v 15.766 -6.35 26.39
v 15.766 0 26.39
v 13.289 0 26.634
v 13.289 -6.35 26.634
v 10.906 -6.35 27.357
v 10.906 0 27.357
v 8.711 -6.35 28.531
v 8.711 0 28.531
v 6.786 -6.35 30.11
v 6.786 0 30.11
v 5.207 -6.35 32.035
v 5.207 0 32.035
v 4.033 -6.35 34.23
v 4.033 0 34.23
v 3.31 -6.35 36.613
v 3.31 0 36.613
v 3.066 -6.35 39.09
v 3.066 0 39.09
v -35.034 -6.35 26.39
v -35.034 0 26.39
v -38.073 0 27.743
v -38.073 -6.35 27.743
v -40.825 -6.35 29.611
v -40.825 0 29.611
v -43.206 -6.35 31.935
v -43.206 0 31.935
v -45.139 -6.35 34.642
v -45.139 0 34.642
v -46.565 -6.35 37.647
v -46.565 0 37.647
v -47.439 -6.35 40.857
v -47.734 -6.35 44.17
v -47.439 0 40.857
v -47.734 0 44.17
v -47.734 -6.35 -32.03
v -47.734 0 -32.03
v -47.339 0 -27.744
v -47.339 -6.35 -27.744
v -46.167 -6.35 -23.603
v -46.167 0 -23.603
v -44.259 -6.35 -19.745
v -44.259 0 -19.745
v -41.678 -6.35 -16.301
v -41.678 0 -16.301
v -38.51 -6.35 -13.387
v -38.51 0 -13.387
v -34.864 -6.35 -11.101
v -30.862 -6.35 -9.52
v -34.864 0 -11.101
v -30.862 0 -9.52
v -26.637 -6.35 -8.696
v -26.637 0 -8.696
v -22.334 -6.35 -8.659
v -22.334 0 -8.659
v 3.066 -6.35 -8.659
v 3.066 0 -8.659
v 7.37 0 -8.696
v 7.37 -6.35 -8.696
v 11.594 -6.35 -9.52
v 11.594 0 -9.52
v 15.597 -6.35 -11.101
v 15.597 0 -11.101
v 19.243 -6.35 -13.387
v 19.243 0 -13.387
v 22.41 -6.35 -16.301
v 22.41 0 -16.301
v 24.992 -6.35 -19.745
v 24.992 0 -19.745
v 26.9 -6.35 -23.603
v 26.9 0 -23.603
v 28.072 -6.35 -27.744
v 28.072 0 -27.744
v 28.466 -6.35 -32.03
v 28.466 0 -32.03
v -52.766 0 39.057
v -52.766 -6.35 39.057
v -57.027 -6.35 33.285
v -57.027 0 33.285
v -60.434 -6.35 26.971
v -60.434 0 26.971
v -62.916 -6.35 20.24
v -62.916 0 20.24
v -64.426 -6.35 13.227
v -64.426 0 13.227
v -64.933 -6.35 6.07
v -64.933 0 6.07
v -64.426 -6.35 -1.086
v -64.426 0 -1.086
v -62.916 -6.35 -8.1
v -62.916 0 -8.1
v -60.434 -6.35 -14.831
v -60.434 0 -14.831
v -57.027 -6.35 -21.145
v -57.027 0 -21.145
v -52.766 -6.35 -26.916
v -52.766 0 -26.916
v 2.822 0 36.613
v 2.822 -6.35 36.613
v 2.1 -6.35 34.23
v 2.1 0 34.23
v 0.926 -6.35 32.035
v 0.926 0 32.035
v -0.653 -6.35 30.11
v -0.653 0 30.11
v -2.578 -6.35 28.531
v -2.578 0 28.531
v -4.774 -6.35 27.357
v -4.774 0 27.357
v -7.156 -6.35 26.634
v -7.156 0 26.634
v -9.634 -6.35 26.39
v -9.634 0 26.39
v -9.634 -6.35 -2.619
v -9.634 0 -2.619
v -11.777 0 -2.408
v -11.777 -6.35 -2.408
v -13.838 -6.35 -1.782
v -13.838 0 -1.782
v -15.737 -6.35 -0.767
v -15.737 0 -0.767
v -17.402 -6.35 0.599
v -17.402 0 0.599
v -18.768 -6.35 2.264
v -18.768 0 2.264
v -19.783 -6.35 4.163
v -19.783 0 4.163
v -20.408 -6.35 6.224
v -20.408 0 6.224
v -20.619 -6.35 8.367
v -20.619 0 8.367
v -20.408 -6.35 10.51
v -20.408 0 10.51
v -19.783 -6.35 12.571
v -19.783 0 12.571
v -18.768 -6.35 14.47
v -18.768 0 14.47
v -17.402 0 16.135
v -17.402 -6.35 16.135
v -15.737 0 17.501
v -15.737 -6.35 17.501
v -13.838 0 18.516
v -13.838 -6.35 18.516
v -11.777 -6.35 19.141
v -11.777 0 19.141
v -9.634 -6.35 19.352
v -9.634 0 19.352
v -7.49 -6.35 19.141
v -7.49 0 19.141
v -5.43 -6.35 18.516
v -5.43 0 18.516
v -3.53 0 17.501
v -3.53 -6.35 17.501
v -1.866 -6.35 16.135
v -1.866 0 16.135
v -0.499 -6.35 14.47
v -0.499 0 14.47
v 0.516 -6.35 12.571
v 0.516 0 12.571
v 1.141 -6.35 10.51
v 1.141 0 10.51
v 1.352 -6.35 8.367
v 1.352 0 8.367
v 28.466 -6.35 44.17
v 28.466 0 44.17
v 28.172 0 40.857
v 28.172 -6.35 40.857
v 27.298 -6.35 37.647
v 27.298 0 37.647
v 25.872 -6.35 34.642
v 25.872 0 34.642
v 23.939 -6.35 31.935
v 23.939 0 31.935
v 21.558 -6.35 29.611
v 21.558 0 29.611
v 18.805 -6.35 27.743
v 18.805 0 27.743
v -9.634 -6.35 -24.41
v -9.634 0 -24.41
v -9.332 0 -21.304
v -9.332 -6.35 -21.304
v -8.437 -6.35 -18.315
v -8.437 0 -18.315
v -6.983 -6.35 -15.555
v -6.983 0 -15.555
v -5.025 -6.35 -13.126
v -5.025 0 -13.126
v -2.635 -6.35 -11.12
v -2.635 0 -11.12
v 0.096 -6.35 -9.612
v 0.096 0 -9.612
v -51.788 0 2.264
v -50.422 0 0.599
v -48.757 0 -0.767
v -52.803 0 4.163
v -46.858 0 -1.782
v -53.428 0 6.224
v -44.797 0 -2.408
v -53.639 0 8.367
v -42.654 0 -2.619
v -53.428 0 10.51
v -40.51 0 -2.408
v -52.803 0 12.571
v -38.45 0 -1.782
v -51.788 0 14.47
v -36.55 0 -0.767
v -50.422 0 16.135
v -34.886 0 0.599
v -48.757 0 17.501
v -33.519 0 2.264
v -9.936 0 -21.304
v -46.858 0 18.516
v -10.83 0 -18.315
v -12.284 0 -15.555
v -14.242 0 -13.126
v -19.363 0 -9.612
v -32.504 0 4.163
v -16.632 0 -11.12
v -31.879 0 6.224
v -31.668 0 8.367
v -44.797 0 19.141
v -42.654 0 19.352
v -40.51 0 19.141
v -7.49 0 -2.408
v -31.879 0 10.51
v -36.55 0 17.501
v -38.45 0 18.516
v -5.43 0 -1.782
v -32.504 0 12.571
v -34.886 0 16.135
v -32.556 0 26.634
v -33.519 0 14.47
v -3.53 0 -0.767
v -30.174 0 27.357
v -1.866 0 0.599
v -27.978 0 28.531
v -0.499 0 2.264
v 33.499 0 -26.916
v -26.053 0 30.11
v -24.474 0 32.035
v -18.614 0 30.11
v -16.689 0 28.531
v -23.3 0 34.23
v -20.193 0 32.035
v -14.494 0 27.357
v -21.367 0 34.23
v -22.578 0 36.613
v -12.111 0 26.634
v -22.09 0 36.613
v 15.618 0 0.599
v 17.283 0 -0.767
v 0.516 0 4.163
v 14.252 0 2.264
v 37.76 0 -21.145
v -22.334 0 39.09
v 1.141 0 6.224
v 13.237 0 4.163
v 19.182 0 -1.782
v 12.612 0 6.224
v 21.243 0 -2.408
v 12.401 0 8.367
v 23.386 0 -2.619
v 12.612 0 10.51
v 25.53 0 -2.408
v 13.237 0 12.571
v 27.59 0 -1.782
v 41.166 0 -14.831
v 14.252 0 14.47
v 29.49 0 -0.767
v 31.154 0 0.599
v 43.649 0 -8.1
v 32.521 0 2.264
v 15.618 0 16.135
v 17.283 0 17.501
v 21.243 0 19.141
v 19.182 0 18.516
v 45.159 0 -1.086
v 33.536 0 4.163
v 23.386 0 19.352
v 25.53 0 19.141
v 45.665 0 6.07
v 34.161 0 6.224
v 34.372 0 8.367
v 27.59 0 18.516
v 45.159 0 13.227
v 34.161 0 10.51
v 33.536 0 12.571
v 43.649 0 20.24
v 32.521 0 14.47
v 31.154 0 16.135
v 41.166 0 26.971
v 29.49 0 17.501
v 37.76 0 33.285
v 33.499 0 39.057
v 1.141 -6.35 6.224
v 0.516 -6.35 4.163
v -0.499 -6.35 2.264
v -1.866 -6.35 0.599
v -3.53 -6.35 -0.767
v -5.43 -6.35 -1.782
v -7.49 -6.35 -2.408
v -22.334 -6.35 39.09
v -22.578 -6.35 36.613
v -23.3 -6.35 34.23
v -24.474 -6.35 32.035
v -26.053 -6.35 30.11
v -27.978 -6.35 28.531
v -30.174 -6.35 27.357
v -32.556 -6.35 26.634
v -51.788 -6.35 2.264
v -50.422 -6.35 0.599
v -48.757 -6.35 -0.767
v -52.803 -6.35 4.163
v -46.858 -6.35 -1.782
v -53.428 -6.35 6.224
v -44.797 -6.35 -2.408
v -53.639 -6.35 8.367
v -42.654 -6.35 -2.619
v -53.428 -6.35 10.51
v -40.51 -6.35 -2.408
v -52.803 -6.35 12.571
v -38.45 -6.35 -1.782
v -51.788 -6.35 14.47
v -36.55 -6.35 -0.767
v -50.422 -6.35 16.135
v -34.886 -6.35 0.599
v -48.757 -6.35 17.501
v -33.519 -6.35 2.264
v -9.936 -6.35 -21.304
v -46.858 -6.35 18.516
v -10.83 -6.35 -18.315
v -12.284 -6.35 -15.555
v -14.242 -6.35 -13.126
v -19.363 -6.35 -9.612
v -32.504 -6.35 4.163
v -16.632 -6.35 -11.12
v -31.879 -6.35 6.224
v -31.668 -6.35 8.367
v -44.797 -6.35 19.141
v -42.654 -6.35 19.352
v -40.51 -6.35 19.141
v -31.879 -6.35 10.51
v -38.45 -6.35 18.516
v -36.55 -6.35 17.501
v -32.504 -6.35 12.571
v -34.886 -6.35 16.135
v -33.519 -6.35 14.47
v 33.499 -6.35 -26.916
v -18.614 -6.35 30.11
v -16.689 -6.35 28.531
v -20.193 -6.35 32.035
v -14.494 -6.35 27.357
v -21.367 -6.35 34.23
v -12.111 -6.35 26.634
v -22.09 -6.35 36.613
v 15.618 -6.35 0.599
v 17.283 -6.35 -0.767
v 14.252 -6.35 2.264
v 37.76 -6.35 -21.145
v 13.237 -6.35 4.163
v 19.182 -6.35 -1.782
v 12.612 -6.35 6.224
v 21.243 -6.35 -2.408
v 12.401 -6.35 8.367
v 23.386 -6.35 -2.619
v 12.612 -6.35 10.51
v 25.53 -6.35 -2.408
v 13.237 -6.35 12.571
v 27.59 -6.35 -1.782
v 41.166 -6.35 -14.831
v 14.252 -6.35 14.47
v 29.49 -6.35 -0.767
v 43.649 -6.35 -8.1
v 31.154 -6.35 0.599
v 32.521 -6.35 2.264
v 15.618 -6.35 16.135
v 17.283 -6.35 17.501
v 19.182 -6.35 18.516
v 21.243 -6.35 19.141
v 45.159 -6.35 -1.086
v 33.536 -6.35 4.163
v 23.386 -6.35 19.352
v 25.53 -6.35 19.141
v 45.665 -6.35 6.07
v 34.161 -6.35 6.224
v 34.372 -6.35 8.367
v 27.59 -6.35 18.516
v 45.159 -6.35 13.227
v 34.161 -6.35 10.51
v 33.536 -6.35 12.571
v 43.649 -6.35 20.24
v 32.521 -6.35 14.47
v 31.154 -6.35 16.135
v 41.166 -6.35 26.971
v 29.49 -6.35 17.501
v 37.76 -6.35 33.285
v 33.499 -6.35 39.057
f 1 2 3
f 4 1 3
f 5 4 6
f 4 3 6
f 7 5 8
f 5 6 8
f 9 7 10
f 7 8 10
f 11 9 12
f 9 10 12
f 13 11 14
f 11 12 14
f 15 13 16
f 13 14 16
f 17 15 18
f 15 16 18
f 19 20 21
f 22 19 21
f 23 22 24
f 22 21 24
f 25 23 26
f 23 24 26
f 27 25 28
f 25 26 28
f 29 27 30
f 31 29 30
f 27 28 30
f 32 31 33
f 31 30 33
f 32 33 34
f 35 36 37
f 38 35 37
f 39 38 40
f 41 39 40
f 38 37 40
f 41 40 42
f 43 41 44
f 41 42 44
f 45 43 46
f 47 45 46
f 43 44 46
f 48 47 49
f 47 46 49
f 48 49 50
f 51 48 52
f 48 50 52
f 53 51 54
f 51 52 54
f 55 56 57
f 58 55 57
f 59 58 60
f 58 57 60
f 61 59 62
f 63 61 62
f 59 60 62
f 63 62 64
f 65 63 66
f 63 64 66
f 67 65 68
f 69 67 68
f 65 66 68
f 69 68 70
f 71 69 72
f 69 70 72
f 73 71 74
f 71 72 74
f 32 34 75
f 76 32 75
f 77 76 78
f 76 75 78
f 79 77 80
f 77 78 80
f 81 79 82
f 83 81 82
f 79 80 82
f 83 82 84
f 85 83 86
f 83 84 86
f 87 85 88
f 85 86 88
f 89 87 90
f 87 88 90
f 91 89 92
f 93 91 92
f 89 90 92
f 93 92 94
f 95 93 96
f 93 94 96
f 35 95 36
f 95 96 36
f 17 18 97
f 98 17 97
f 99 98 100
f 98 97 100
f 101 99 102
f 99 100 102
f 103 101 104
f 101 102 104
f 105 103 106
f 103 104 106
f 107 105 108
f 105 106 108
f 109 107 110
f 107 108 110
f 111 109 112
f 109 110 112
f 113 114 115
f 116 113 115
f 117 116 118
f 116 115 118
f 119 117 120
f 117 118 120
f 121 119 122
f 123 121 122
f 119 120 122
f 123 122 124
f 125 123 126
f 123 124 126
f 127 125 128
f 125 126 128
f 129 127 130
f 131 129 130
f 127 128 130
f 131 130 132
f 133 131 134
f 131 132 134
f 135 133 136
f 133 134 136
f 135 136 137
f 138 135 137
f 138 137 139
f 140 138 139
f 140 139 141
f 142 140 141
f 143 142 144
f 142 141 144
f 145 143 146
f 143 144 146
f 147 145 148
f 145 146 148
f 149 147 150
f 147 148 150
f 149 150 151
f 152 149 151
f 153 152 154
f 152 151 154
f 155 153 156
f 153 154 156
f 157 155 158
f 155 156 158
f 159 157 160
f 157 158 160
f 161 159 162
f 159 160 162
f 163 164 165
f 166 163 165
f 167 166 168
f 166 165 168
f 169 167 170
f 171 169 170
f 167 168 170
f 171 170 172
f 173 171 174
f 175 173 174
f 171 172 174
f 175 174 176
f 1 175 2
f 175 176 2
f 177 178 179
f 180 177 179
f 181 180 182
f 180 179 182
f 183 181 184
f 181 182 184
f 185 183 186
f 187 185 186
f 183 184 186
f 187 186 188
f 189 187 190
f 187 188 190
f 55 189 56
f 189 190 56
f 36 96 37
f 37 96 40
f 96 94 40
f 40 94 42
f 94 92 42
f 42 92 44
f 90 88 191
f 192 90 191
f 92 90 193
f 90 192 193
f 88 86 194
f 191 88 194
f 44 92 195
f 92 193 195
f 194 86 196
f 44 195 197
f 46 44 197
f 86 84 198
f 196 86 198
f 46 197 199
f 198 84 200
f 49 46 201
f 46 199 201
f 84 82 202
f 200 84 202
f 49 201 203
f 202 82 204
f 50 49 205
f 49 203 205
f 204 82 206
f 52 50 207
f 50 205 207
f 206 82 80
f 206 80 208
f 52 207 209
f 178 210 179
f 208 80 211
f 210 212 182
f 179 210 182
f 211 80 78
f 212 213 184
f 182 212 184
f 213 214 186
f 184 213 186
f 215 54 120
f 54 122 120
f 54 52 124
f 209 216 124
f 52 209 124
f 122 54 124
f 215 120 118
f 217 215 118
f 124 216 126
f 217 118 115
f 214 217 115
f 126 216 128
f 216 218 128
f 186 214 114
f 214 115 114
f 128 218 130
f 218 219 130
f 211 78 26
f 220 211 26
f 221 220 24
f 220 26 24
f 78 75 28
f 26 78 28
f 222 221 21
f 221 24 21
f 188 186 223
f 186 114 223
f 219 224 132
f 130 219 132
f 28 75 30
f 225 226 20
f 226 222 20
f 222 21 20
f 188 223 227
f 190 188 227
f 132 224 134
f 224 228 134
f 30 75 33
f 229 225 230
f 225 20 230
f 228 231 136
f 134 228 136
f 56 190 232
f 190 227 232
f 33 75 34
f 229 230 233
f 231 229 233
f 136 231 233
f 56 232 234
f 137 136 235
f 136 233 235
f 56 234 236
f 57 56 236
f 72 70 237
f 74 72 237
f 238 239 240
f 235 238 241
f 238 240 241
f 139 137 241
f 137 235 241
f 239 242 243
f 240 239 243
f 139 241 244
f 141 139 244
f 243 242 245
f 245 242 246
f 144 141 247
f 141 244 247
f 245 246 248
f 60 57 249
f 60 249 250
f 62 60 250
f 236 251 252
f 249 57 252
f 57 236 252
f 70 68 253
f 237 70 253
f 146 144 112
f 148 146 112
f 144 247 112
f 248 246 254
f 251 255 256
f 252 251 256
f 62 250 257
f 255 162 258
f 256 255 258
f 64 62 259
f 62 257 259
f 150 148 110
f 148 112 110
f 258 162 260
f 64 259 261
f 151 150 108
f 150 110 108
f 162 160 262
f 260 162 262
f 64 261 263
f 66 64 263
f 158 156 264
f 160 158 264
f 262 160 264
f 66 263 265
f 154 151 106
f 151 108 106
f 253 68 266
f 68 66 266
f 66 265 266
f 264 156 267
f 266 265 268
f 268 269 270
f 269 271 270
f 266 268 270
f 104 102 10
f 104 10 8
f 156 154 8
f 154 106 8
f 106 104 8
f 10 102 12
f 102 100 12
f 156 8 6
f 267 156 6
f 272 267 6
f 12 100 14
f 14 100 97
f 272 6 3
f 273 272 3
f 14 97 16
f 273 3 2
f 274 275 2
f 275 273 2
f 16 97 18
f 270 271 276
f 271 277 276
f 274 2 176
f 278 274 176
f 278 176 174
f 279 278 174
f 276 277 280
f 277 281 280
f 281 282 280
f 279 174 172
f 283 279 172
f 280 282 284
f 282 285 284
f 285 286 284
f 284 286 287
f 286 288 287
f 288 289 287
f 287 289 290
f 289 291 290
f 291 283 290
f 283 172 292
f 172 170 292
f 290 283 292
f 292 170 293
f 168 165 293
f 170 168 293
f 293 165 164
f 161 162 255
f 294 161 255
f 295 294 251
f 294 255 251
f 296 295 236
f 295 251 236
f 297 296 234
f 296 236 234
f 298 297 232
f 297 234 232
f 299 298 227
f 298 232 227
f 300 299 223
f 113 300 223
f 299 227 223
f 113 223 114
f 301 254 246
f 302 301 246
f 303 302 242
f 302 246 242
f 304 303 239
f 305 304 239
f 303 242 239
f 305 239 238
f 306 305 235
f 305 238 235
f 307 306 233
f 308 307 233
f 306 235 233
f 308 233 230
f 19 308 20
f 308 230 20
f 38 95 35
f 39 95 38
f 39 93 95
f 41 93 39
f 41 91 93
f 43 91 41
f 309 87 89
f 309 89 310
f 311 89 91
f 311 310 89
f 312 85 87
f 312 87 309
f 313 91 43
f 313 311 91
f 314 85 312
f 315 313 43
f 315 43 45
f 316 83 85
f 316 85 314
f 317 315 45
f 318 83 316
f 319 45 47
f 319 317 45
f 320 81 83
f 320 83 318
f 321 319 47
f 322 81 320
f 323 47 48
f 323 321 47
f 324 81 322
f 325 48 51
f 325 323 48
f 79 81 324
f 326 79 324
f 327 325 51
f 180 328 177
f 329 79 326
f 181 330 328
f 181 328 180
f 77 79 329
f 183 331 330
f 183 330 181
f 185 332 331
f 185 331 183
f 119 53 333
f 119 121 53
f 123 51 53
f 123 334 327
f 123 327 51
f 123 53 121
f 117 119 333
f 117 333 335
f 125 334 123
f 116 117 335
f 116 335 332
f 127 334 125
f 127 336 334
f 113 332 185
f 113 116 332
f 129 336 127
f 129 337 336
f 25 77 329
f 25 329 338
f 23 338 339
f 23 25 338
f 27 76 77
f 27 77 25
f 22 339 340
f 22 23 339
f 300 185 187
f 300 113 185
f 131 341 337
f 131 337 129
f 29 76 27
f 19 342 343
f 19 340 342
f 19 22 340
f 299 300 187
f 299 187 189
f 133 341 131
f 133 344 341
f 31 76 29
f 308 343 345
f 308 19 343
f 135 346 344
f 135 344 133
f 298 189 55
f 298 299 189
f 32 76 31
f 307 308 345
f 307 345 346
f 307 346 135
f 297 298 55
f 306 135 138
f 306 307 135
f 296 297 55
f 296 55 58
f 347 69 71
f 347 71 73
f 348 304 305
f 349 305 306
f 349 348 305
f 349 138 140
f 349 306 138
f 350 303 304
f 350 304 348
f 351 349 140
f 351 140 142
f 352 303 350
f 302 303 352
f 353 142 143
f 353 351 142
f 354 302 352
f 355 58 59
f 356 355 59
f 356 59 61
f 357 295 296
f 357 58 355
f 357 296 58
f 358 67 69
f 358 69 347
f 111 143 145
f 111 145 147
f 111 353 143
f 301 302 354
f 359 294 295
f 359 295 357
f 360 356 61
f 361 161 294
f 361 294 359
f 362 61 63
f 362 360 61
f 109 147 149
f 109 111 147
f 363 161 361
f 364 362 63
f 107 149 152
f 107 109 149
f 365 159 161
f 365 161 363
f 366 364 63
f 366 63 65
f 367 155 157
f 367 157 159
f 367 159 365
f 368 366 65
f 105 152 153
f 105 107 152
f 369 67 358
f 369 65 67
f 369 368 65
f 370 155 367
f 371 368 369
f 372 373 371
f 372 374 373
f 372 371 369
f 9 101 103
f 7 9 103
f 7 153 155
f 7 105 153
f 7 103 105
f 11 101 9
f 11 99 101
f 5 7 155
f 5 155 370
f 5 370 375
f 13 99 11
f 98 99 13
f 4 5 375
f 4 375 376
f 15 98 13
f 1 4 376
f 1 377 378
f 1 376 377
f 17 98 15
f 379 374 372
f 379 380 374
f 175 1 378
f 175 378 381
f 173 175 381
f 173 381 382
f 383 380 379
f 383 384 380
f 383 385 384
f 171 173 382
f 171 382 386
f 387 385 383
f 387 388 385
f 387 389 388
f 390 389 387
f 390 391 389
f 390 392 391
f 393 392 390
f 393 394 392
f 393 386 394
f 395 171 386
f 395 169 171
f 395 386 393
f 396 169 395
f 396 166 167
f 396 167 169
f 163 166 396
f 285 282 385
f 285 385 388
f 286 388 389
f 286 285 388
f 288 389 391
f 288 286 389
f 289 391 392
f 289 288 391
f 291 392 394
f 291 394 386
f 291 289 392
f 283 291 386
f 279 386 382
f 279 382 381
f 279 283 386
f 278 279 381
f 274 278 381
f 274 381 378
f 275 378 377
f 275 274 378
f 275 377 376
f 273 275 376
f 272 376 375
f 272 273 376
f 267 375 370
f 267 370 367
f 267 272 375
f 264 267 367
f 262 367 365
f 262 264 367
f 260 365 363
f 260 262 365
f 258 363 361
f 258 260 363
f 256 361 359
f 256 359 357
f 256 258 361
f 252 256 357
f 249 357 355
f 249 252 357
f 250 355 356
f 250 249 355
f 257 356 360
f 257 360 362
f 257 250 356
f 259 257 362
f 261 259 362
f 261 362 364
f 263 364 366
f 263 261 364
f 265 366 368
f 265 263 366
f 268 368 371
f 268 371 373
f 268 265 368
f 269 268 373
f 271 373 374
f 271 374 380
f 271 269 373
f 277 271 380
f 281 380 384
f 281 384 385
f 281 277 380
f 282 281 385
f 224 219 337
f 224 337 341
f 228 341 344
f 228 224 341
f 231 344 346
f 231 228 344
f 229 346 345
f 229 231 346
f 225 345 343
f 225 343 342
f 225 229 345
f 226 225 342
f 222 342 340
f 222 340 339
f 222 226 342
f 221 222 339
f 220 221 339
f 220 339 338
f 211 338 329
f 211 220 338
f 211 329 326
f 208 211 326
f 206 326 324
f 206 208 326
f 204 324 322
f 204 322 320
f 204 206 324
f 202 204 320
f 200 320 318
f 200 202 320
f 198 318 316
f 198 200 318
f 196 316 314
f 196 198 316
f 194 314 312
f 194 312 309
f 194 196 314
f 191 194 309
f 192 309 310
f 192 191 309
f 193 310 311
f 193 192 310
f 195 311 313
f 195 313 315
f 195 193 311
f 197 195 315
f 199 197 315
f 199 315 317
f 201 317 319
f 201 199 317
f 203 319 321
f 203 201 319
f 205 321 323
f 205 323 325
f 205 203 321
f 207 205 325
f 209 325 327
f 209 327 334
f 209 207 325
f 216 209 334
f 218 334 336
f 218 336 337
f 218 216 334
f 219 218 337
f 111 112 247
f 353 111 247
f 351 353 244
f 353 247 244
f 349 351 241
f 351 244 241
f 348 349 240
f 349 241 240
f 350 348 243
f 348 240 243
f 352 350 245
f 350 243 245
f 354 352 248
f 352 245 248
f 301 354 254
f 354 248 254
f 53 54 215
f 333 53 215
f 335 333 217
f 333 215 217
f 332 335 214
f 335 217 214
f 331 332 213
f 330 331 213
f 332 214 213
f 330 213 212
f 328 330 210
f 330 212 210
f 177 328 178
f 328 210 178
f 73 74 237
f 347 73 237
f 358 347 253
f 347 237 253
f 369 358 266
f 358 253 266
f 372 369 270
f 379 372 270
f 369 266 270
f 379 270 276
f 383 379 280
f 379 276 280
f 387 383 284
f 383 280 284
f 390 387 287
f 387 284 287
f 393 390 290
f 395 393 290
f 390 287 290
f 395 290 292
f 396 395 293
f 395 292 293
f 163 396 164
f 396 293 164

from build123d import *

# Parameters (mm, degrees)
F0_R     = 10.9855
F1_DEPTH = 6.35


with BuildPart() as f1:
    # F0 (on Front) → F1 (new body)
    with BuildSketch(Plane.XZ):
        with BuildLine():
            ThreePointArc((-22.3335889539, 39.0903010637), (-26.0533328328, 30.1100449426), (-35.0335889539, 26.3903010637))
            ThreePointArc((-35.0335889539, 26.3903010637), (-44.2325232787, 33.2453479745), (-47.7335889539, 44.1703010637))
            ThreePointArc((-47.7335889539, 44.1703010637), (-64.9325473034, 6.0703010637), (-47.7335889539, -32.0296989363))
            ThreePointArc((-47.7335889539, -32.0296989363), (-40.1610226456, -14.7715689431), (-22.3335889539, -8.6585157515))
            ThreePointArc((-22.3335889539, -8.6585157515), (-13.2040635929, -14.2930076328), (-9.6335889539, -24.4096989363))
            ThreePointArc((-9.6335889539, -24.4096989363), (-6.0631143149, -14.2930076328), (3.0664110461, -8.6585157515))
            ThreePointArc((3.0664110461, -8.6585157515), (20.8938447379, -14.7715689431), (28.4664110461, -32.0296989363))
            ThreePointArc((28.4664110461, -32.0296989363), (45.6653693956, 6.0703010637), (28.4664110461, 44.1703010637))
            ThreePointArc((28.4664110461, 44.1703010637), (24.9653453709, 33.2453479745), (15.7664110461, 26.3903010637))
            ThreePointArc((15.7664110461, 26.3903010637), (6.7861549251, 30.1100449426), (3.0664110461, 39.0903010637))
            ThreePointArc((3.0664110461, 39.0903010637), (-0.6533328328, 30.1100449426), (-9.6335889539, 26.3903010637))
            ThreePointArc((-9.6335889539, 26.3903010637), (-18.6138450749, 30.1100449426), (-22.3335889539, 39.0903010637))
        make_face()
        with Locations((-42.6535889539, 8.3668298817)):
            Circle(F0_R, mode=Mode.SUBTRACT)
        with BuildLine():
            ThreePointArc((-9.6335889539, -2.6186701183), (-17.4015104986, 16.1347514264), (1.3519110461, 8.3668298817))
            ThreePointArc((1.3519110461, 8.3668298817), (-1.8656674092, 0.598908337), (-9.6335889539, -2.6186701183))
        make_face(mode=Mode.SUBTRACT)
        with Locations((23.3864110461, 8.3668298817)):
            Circle(F0_R, mode=Mode.SUBTRACT)
    extrude(amount=F1_DEPTH)


solid = f1.part
